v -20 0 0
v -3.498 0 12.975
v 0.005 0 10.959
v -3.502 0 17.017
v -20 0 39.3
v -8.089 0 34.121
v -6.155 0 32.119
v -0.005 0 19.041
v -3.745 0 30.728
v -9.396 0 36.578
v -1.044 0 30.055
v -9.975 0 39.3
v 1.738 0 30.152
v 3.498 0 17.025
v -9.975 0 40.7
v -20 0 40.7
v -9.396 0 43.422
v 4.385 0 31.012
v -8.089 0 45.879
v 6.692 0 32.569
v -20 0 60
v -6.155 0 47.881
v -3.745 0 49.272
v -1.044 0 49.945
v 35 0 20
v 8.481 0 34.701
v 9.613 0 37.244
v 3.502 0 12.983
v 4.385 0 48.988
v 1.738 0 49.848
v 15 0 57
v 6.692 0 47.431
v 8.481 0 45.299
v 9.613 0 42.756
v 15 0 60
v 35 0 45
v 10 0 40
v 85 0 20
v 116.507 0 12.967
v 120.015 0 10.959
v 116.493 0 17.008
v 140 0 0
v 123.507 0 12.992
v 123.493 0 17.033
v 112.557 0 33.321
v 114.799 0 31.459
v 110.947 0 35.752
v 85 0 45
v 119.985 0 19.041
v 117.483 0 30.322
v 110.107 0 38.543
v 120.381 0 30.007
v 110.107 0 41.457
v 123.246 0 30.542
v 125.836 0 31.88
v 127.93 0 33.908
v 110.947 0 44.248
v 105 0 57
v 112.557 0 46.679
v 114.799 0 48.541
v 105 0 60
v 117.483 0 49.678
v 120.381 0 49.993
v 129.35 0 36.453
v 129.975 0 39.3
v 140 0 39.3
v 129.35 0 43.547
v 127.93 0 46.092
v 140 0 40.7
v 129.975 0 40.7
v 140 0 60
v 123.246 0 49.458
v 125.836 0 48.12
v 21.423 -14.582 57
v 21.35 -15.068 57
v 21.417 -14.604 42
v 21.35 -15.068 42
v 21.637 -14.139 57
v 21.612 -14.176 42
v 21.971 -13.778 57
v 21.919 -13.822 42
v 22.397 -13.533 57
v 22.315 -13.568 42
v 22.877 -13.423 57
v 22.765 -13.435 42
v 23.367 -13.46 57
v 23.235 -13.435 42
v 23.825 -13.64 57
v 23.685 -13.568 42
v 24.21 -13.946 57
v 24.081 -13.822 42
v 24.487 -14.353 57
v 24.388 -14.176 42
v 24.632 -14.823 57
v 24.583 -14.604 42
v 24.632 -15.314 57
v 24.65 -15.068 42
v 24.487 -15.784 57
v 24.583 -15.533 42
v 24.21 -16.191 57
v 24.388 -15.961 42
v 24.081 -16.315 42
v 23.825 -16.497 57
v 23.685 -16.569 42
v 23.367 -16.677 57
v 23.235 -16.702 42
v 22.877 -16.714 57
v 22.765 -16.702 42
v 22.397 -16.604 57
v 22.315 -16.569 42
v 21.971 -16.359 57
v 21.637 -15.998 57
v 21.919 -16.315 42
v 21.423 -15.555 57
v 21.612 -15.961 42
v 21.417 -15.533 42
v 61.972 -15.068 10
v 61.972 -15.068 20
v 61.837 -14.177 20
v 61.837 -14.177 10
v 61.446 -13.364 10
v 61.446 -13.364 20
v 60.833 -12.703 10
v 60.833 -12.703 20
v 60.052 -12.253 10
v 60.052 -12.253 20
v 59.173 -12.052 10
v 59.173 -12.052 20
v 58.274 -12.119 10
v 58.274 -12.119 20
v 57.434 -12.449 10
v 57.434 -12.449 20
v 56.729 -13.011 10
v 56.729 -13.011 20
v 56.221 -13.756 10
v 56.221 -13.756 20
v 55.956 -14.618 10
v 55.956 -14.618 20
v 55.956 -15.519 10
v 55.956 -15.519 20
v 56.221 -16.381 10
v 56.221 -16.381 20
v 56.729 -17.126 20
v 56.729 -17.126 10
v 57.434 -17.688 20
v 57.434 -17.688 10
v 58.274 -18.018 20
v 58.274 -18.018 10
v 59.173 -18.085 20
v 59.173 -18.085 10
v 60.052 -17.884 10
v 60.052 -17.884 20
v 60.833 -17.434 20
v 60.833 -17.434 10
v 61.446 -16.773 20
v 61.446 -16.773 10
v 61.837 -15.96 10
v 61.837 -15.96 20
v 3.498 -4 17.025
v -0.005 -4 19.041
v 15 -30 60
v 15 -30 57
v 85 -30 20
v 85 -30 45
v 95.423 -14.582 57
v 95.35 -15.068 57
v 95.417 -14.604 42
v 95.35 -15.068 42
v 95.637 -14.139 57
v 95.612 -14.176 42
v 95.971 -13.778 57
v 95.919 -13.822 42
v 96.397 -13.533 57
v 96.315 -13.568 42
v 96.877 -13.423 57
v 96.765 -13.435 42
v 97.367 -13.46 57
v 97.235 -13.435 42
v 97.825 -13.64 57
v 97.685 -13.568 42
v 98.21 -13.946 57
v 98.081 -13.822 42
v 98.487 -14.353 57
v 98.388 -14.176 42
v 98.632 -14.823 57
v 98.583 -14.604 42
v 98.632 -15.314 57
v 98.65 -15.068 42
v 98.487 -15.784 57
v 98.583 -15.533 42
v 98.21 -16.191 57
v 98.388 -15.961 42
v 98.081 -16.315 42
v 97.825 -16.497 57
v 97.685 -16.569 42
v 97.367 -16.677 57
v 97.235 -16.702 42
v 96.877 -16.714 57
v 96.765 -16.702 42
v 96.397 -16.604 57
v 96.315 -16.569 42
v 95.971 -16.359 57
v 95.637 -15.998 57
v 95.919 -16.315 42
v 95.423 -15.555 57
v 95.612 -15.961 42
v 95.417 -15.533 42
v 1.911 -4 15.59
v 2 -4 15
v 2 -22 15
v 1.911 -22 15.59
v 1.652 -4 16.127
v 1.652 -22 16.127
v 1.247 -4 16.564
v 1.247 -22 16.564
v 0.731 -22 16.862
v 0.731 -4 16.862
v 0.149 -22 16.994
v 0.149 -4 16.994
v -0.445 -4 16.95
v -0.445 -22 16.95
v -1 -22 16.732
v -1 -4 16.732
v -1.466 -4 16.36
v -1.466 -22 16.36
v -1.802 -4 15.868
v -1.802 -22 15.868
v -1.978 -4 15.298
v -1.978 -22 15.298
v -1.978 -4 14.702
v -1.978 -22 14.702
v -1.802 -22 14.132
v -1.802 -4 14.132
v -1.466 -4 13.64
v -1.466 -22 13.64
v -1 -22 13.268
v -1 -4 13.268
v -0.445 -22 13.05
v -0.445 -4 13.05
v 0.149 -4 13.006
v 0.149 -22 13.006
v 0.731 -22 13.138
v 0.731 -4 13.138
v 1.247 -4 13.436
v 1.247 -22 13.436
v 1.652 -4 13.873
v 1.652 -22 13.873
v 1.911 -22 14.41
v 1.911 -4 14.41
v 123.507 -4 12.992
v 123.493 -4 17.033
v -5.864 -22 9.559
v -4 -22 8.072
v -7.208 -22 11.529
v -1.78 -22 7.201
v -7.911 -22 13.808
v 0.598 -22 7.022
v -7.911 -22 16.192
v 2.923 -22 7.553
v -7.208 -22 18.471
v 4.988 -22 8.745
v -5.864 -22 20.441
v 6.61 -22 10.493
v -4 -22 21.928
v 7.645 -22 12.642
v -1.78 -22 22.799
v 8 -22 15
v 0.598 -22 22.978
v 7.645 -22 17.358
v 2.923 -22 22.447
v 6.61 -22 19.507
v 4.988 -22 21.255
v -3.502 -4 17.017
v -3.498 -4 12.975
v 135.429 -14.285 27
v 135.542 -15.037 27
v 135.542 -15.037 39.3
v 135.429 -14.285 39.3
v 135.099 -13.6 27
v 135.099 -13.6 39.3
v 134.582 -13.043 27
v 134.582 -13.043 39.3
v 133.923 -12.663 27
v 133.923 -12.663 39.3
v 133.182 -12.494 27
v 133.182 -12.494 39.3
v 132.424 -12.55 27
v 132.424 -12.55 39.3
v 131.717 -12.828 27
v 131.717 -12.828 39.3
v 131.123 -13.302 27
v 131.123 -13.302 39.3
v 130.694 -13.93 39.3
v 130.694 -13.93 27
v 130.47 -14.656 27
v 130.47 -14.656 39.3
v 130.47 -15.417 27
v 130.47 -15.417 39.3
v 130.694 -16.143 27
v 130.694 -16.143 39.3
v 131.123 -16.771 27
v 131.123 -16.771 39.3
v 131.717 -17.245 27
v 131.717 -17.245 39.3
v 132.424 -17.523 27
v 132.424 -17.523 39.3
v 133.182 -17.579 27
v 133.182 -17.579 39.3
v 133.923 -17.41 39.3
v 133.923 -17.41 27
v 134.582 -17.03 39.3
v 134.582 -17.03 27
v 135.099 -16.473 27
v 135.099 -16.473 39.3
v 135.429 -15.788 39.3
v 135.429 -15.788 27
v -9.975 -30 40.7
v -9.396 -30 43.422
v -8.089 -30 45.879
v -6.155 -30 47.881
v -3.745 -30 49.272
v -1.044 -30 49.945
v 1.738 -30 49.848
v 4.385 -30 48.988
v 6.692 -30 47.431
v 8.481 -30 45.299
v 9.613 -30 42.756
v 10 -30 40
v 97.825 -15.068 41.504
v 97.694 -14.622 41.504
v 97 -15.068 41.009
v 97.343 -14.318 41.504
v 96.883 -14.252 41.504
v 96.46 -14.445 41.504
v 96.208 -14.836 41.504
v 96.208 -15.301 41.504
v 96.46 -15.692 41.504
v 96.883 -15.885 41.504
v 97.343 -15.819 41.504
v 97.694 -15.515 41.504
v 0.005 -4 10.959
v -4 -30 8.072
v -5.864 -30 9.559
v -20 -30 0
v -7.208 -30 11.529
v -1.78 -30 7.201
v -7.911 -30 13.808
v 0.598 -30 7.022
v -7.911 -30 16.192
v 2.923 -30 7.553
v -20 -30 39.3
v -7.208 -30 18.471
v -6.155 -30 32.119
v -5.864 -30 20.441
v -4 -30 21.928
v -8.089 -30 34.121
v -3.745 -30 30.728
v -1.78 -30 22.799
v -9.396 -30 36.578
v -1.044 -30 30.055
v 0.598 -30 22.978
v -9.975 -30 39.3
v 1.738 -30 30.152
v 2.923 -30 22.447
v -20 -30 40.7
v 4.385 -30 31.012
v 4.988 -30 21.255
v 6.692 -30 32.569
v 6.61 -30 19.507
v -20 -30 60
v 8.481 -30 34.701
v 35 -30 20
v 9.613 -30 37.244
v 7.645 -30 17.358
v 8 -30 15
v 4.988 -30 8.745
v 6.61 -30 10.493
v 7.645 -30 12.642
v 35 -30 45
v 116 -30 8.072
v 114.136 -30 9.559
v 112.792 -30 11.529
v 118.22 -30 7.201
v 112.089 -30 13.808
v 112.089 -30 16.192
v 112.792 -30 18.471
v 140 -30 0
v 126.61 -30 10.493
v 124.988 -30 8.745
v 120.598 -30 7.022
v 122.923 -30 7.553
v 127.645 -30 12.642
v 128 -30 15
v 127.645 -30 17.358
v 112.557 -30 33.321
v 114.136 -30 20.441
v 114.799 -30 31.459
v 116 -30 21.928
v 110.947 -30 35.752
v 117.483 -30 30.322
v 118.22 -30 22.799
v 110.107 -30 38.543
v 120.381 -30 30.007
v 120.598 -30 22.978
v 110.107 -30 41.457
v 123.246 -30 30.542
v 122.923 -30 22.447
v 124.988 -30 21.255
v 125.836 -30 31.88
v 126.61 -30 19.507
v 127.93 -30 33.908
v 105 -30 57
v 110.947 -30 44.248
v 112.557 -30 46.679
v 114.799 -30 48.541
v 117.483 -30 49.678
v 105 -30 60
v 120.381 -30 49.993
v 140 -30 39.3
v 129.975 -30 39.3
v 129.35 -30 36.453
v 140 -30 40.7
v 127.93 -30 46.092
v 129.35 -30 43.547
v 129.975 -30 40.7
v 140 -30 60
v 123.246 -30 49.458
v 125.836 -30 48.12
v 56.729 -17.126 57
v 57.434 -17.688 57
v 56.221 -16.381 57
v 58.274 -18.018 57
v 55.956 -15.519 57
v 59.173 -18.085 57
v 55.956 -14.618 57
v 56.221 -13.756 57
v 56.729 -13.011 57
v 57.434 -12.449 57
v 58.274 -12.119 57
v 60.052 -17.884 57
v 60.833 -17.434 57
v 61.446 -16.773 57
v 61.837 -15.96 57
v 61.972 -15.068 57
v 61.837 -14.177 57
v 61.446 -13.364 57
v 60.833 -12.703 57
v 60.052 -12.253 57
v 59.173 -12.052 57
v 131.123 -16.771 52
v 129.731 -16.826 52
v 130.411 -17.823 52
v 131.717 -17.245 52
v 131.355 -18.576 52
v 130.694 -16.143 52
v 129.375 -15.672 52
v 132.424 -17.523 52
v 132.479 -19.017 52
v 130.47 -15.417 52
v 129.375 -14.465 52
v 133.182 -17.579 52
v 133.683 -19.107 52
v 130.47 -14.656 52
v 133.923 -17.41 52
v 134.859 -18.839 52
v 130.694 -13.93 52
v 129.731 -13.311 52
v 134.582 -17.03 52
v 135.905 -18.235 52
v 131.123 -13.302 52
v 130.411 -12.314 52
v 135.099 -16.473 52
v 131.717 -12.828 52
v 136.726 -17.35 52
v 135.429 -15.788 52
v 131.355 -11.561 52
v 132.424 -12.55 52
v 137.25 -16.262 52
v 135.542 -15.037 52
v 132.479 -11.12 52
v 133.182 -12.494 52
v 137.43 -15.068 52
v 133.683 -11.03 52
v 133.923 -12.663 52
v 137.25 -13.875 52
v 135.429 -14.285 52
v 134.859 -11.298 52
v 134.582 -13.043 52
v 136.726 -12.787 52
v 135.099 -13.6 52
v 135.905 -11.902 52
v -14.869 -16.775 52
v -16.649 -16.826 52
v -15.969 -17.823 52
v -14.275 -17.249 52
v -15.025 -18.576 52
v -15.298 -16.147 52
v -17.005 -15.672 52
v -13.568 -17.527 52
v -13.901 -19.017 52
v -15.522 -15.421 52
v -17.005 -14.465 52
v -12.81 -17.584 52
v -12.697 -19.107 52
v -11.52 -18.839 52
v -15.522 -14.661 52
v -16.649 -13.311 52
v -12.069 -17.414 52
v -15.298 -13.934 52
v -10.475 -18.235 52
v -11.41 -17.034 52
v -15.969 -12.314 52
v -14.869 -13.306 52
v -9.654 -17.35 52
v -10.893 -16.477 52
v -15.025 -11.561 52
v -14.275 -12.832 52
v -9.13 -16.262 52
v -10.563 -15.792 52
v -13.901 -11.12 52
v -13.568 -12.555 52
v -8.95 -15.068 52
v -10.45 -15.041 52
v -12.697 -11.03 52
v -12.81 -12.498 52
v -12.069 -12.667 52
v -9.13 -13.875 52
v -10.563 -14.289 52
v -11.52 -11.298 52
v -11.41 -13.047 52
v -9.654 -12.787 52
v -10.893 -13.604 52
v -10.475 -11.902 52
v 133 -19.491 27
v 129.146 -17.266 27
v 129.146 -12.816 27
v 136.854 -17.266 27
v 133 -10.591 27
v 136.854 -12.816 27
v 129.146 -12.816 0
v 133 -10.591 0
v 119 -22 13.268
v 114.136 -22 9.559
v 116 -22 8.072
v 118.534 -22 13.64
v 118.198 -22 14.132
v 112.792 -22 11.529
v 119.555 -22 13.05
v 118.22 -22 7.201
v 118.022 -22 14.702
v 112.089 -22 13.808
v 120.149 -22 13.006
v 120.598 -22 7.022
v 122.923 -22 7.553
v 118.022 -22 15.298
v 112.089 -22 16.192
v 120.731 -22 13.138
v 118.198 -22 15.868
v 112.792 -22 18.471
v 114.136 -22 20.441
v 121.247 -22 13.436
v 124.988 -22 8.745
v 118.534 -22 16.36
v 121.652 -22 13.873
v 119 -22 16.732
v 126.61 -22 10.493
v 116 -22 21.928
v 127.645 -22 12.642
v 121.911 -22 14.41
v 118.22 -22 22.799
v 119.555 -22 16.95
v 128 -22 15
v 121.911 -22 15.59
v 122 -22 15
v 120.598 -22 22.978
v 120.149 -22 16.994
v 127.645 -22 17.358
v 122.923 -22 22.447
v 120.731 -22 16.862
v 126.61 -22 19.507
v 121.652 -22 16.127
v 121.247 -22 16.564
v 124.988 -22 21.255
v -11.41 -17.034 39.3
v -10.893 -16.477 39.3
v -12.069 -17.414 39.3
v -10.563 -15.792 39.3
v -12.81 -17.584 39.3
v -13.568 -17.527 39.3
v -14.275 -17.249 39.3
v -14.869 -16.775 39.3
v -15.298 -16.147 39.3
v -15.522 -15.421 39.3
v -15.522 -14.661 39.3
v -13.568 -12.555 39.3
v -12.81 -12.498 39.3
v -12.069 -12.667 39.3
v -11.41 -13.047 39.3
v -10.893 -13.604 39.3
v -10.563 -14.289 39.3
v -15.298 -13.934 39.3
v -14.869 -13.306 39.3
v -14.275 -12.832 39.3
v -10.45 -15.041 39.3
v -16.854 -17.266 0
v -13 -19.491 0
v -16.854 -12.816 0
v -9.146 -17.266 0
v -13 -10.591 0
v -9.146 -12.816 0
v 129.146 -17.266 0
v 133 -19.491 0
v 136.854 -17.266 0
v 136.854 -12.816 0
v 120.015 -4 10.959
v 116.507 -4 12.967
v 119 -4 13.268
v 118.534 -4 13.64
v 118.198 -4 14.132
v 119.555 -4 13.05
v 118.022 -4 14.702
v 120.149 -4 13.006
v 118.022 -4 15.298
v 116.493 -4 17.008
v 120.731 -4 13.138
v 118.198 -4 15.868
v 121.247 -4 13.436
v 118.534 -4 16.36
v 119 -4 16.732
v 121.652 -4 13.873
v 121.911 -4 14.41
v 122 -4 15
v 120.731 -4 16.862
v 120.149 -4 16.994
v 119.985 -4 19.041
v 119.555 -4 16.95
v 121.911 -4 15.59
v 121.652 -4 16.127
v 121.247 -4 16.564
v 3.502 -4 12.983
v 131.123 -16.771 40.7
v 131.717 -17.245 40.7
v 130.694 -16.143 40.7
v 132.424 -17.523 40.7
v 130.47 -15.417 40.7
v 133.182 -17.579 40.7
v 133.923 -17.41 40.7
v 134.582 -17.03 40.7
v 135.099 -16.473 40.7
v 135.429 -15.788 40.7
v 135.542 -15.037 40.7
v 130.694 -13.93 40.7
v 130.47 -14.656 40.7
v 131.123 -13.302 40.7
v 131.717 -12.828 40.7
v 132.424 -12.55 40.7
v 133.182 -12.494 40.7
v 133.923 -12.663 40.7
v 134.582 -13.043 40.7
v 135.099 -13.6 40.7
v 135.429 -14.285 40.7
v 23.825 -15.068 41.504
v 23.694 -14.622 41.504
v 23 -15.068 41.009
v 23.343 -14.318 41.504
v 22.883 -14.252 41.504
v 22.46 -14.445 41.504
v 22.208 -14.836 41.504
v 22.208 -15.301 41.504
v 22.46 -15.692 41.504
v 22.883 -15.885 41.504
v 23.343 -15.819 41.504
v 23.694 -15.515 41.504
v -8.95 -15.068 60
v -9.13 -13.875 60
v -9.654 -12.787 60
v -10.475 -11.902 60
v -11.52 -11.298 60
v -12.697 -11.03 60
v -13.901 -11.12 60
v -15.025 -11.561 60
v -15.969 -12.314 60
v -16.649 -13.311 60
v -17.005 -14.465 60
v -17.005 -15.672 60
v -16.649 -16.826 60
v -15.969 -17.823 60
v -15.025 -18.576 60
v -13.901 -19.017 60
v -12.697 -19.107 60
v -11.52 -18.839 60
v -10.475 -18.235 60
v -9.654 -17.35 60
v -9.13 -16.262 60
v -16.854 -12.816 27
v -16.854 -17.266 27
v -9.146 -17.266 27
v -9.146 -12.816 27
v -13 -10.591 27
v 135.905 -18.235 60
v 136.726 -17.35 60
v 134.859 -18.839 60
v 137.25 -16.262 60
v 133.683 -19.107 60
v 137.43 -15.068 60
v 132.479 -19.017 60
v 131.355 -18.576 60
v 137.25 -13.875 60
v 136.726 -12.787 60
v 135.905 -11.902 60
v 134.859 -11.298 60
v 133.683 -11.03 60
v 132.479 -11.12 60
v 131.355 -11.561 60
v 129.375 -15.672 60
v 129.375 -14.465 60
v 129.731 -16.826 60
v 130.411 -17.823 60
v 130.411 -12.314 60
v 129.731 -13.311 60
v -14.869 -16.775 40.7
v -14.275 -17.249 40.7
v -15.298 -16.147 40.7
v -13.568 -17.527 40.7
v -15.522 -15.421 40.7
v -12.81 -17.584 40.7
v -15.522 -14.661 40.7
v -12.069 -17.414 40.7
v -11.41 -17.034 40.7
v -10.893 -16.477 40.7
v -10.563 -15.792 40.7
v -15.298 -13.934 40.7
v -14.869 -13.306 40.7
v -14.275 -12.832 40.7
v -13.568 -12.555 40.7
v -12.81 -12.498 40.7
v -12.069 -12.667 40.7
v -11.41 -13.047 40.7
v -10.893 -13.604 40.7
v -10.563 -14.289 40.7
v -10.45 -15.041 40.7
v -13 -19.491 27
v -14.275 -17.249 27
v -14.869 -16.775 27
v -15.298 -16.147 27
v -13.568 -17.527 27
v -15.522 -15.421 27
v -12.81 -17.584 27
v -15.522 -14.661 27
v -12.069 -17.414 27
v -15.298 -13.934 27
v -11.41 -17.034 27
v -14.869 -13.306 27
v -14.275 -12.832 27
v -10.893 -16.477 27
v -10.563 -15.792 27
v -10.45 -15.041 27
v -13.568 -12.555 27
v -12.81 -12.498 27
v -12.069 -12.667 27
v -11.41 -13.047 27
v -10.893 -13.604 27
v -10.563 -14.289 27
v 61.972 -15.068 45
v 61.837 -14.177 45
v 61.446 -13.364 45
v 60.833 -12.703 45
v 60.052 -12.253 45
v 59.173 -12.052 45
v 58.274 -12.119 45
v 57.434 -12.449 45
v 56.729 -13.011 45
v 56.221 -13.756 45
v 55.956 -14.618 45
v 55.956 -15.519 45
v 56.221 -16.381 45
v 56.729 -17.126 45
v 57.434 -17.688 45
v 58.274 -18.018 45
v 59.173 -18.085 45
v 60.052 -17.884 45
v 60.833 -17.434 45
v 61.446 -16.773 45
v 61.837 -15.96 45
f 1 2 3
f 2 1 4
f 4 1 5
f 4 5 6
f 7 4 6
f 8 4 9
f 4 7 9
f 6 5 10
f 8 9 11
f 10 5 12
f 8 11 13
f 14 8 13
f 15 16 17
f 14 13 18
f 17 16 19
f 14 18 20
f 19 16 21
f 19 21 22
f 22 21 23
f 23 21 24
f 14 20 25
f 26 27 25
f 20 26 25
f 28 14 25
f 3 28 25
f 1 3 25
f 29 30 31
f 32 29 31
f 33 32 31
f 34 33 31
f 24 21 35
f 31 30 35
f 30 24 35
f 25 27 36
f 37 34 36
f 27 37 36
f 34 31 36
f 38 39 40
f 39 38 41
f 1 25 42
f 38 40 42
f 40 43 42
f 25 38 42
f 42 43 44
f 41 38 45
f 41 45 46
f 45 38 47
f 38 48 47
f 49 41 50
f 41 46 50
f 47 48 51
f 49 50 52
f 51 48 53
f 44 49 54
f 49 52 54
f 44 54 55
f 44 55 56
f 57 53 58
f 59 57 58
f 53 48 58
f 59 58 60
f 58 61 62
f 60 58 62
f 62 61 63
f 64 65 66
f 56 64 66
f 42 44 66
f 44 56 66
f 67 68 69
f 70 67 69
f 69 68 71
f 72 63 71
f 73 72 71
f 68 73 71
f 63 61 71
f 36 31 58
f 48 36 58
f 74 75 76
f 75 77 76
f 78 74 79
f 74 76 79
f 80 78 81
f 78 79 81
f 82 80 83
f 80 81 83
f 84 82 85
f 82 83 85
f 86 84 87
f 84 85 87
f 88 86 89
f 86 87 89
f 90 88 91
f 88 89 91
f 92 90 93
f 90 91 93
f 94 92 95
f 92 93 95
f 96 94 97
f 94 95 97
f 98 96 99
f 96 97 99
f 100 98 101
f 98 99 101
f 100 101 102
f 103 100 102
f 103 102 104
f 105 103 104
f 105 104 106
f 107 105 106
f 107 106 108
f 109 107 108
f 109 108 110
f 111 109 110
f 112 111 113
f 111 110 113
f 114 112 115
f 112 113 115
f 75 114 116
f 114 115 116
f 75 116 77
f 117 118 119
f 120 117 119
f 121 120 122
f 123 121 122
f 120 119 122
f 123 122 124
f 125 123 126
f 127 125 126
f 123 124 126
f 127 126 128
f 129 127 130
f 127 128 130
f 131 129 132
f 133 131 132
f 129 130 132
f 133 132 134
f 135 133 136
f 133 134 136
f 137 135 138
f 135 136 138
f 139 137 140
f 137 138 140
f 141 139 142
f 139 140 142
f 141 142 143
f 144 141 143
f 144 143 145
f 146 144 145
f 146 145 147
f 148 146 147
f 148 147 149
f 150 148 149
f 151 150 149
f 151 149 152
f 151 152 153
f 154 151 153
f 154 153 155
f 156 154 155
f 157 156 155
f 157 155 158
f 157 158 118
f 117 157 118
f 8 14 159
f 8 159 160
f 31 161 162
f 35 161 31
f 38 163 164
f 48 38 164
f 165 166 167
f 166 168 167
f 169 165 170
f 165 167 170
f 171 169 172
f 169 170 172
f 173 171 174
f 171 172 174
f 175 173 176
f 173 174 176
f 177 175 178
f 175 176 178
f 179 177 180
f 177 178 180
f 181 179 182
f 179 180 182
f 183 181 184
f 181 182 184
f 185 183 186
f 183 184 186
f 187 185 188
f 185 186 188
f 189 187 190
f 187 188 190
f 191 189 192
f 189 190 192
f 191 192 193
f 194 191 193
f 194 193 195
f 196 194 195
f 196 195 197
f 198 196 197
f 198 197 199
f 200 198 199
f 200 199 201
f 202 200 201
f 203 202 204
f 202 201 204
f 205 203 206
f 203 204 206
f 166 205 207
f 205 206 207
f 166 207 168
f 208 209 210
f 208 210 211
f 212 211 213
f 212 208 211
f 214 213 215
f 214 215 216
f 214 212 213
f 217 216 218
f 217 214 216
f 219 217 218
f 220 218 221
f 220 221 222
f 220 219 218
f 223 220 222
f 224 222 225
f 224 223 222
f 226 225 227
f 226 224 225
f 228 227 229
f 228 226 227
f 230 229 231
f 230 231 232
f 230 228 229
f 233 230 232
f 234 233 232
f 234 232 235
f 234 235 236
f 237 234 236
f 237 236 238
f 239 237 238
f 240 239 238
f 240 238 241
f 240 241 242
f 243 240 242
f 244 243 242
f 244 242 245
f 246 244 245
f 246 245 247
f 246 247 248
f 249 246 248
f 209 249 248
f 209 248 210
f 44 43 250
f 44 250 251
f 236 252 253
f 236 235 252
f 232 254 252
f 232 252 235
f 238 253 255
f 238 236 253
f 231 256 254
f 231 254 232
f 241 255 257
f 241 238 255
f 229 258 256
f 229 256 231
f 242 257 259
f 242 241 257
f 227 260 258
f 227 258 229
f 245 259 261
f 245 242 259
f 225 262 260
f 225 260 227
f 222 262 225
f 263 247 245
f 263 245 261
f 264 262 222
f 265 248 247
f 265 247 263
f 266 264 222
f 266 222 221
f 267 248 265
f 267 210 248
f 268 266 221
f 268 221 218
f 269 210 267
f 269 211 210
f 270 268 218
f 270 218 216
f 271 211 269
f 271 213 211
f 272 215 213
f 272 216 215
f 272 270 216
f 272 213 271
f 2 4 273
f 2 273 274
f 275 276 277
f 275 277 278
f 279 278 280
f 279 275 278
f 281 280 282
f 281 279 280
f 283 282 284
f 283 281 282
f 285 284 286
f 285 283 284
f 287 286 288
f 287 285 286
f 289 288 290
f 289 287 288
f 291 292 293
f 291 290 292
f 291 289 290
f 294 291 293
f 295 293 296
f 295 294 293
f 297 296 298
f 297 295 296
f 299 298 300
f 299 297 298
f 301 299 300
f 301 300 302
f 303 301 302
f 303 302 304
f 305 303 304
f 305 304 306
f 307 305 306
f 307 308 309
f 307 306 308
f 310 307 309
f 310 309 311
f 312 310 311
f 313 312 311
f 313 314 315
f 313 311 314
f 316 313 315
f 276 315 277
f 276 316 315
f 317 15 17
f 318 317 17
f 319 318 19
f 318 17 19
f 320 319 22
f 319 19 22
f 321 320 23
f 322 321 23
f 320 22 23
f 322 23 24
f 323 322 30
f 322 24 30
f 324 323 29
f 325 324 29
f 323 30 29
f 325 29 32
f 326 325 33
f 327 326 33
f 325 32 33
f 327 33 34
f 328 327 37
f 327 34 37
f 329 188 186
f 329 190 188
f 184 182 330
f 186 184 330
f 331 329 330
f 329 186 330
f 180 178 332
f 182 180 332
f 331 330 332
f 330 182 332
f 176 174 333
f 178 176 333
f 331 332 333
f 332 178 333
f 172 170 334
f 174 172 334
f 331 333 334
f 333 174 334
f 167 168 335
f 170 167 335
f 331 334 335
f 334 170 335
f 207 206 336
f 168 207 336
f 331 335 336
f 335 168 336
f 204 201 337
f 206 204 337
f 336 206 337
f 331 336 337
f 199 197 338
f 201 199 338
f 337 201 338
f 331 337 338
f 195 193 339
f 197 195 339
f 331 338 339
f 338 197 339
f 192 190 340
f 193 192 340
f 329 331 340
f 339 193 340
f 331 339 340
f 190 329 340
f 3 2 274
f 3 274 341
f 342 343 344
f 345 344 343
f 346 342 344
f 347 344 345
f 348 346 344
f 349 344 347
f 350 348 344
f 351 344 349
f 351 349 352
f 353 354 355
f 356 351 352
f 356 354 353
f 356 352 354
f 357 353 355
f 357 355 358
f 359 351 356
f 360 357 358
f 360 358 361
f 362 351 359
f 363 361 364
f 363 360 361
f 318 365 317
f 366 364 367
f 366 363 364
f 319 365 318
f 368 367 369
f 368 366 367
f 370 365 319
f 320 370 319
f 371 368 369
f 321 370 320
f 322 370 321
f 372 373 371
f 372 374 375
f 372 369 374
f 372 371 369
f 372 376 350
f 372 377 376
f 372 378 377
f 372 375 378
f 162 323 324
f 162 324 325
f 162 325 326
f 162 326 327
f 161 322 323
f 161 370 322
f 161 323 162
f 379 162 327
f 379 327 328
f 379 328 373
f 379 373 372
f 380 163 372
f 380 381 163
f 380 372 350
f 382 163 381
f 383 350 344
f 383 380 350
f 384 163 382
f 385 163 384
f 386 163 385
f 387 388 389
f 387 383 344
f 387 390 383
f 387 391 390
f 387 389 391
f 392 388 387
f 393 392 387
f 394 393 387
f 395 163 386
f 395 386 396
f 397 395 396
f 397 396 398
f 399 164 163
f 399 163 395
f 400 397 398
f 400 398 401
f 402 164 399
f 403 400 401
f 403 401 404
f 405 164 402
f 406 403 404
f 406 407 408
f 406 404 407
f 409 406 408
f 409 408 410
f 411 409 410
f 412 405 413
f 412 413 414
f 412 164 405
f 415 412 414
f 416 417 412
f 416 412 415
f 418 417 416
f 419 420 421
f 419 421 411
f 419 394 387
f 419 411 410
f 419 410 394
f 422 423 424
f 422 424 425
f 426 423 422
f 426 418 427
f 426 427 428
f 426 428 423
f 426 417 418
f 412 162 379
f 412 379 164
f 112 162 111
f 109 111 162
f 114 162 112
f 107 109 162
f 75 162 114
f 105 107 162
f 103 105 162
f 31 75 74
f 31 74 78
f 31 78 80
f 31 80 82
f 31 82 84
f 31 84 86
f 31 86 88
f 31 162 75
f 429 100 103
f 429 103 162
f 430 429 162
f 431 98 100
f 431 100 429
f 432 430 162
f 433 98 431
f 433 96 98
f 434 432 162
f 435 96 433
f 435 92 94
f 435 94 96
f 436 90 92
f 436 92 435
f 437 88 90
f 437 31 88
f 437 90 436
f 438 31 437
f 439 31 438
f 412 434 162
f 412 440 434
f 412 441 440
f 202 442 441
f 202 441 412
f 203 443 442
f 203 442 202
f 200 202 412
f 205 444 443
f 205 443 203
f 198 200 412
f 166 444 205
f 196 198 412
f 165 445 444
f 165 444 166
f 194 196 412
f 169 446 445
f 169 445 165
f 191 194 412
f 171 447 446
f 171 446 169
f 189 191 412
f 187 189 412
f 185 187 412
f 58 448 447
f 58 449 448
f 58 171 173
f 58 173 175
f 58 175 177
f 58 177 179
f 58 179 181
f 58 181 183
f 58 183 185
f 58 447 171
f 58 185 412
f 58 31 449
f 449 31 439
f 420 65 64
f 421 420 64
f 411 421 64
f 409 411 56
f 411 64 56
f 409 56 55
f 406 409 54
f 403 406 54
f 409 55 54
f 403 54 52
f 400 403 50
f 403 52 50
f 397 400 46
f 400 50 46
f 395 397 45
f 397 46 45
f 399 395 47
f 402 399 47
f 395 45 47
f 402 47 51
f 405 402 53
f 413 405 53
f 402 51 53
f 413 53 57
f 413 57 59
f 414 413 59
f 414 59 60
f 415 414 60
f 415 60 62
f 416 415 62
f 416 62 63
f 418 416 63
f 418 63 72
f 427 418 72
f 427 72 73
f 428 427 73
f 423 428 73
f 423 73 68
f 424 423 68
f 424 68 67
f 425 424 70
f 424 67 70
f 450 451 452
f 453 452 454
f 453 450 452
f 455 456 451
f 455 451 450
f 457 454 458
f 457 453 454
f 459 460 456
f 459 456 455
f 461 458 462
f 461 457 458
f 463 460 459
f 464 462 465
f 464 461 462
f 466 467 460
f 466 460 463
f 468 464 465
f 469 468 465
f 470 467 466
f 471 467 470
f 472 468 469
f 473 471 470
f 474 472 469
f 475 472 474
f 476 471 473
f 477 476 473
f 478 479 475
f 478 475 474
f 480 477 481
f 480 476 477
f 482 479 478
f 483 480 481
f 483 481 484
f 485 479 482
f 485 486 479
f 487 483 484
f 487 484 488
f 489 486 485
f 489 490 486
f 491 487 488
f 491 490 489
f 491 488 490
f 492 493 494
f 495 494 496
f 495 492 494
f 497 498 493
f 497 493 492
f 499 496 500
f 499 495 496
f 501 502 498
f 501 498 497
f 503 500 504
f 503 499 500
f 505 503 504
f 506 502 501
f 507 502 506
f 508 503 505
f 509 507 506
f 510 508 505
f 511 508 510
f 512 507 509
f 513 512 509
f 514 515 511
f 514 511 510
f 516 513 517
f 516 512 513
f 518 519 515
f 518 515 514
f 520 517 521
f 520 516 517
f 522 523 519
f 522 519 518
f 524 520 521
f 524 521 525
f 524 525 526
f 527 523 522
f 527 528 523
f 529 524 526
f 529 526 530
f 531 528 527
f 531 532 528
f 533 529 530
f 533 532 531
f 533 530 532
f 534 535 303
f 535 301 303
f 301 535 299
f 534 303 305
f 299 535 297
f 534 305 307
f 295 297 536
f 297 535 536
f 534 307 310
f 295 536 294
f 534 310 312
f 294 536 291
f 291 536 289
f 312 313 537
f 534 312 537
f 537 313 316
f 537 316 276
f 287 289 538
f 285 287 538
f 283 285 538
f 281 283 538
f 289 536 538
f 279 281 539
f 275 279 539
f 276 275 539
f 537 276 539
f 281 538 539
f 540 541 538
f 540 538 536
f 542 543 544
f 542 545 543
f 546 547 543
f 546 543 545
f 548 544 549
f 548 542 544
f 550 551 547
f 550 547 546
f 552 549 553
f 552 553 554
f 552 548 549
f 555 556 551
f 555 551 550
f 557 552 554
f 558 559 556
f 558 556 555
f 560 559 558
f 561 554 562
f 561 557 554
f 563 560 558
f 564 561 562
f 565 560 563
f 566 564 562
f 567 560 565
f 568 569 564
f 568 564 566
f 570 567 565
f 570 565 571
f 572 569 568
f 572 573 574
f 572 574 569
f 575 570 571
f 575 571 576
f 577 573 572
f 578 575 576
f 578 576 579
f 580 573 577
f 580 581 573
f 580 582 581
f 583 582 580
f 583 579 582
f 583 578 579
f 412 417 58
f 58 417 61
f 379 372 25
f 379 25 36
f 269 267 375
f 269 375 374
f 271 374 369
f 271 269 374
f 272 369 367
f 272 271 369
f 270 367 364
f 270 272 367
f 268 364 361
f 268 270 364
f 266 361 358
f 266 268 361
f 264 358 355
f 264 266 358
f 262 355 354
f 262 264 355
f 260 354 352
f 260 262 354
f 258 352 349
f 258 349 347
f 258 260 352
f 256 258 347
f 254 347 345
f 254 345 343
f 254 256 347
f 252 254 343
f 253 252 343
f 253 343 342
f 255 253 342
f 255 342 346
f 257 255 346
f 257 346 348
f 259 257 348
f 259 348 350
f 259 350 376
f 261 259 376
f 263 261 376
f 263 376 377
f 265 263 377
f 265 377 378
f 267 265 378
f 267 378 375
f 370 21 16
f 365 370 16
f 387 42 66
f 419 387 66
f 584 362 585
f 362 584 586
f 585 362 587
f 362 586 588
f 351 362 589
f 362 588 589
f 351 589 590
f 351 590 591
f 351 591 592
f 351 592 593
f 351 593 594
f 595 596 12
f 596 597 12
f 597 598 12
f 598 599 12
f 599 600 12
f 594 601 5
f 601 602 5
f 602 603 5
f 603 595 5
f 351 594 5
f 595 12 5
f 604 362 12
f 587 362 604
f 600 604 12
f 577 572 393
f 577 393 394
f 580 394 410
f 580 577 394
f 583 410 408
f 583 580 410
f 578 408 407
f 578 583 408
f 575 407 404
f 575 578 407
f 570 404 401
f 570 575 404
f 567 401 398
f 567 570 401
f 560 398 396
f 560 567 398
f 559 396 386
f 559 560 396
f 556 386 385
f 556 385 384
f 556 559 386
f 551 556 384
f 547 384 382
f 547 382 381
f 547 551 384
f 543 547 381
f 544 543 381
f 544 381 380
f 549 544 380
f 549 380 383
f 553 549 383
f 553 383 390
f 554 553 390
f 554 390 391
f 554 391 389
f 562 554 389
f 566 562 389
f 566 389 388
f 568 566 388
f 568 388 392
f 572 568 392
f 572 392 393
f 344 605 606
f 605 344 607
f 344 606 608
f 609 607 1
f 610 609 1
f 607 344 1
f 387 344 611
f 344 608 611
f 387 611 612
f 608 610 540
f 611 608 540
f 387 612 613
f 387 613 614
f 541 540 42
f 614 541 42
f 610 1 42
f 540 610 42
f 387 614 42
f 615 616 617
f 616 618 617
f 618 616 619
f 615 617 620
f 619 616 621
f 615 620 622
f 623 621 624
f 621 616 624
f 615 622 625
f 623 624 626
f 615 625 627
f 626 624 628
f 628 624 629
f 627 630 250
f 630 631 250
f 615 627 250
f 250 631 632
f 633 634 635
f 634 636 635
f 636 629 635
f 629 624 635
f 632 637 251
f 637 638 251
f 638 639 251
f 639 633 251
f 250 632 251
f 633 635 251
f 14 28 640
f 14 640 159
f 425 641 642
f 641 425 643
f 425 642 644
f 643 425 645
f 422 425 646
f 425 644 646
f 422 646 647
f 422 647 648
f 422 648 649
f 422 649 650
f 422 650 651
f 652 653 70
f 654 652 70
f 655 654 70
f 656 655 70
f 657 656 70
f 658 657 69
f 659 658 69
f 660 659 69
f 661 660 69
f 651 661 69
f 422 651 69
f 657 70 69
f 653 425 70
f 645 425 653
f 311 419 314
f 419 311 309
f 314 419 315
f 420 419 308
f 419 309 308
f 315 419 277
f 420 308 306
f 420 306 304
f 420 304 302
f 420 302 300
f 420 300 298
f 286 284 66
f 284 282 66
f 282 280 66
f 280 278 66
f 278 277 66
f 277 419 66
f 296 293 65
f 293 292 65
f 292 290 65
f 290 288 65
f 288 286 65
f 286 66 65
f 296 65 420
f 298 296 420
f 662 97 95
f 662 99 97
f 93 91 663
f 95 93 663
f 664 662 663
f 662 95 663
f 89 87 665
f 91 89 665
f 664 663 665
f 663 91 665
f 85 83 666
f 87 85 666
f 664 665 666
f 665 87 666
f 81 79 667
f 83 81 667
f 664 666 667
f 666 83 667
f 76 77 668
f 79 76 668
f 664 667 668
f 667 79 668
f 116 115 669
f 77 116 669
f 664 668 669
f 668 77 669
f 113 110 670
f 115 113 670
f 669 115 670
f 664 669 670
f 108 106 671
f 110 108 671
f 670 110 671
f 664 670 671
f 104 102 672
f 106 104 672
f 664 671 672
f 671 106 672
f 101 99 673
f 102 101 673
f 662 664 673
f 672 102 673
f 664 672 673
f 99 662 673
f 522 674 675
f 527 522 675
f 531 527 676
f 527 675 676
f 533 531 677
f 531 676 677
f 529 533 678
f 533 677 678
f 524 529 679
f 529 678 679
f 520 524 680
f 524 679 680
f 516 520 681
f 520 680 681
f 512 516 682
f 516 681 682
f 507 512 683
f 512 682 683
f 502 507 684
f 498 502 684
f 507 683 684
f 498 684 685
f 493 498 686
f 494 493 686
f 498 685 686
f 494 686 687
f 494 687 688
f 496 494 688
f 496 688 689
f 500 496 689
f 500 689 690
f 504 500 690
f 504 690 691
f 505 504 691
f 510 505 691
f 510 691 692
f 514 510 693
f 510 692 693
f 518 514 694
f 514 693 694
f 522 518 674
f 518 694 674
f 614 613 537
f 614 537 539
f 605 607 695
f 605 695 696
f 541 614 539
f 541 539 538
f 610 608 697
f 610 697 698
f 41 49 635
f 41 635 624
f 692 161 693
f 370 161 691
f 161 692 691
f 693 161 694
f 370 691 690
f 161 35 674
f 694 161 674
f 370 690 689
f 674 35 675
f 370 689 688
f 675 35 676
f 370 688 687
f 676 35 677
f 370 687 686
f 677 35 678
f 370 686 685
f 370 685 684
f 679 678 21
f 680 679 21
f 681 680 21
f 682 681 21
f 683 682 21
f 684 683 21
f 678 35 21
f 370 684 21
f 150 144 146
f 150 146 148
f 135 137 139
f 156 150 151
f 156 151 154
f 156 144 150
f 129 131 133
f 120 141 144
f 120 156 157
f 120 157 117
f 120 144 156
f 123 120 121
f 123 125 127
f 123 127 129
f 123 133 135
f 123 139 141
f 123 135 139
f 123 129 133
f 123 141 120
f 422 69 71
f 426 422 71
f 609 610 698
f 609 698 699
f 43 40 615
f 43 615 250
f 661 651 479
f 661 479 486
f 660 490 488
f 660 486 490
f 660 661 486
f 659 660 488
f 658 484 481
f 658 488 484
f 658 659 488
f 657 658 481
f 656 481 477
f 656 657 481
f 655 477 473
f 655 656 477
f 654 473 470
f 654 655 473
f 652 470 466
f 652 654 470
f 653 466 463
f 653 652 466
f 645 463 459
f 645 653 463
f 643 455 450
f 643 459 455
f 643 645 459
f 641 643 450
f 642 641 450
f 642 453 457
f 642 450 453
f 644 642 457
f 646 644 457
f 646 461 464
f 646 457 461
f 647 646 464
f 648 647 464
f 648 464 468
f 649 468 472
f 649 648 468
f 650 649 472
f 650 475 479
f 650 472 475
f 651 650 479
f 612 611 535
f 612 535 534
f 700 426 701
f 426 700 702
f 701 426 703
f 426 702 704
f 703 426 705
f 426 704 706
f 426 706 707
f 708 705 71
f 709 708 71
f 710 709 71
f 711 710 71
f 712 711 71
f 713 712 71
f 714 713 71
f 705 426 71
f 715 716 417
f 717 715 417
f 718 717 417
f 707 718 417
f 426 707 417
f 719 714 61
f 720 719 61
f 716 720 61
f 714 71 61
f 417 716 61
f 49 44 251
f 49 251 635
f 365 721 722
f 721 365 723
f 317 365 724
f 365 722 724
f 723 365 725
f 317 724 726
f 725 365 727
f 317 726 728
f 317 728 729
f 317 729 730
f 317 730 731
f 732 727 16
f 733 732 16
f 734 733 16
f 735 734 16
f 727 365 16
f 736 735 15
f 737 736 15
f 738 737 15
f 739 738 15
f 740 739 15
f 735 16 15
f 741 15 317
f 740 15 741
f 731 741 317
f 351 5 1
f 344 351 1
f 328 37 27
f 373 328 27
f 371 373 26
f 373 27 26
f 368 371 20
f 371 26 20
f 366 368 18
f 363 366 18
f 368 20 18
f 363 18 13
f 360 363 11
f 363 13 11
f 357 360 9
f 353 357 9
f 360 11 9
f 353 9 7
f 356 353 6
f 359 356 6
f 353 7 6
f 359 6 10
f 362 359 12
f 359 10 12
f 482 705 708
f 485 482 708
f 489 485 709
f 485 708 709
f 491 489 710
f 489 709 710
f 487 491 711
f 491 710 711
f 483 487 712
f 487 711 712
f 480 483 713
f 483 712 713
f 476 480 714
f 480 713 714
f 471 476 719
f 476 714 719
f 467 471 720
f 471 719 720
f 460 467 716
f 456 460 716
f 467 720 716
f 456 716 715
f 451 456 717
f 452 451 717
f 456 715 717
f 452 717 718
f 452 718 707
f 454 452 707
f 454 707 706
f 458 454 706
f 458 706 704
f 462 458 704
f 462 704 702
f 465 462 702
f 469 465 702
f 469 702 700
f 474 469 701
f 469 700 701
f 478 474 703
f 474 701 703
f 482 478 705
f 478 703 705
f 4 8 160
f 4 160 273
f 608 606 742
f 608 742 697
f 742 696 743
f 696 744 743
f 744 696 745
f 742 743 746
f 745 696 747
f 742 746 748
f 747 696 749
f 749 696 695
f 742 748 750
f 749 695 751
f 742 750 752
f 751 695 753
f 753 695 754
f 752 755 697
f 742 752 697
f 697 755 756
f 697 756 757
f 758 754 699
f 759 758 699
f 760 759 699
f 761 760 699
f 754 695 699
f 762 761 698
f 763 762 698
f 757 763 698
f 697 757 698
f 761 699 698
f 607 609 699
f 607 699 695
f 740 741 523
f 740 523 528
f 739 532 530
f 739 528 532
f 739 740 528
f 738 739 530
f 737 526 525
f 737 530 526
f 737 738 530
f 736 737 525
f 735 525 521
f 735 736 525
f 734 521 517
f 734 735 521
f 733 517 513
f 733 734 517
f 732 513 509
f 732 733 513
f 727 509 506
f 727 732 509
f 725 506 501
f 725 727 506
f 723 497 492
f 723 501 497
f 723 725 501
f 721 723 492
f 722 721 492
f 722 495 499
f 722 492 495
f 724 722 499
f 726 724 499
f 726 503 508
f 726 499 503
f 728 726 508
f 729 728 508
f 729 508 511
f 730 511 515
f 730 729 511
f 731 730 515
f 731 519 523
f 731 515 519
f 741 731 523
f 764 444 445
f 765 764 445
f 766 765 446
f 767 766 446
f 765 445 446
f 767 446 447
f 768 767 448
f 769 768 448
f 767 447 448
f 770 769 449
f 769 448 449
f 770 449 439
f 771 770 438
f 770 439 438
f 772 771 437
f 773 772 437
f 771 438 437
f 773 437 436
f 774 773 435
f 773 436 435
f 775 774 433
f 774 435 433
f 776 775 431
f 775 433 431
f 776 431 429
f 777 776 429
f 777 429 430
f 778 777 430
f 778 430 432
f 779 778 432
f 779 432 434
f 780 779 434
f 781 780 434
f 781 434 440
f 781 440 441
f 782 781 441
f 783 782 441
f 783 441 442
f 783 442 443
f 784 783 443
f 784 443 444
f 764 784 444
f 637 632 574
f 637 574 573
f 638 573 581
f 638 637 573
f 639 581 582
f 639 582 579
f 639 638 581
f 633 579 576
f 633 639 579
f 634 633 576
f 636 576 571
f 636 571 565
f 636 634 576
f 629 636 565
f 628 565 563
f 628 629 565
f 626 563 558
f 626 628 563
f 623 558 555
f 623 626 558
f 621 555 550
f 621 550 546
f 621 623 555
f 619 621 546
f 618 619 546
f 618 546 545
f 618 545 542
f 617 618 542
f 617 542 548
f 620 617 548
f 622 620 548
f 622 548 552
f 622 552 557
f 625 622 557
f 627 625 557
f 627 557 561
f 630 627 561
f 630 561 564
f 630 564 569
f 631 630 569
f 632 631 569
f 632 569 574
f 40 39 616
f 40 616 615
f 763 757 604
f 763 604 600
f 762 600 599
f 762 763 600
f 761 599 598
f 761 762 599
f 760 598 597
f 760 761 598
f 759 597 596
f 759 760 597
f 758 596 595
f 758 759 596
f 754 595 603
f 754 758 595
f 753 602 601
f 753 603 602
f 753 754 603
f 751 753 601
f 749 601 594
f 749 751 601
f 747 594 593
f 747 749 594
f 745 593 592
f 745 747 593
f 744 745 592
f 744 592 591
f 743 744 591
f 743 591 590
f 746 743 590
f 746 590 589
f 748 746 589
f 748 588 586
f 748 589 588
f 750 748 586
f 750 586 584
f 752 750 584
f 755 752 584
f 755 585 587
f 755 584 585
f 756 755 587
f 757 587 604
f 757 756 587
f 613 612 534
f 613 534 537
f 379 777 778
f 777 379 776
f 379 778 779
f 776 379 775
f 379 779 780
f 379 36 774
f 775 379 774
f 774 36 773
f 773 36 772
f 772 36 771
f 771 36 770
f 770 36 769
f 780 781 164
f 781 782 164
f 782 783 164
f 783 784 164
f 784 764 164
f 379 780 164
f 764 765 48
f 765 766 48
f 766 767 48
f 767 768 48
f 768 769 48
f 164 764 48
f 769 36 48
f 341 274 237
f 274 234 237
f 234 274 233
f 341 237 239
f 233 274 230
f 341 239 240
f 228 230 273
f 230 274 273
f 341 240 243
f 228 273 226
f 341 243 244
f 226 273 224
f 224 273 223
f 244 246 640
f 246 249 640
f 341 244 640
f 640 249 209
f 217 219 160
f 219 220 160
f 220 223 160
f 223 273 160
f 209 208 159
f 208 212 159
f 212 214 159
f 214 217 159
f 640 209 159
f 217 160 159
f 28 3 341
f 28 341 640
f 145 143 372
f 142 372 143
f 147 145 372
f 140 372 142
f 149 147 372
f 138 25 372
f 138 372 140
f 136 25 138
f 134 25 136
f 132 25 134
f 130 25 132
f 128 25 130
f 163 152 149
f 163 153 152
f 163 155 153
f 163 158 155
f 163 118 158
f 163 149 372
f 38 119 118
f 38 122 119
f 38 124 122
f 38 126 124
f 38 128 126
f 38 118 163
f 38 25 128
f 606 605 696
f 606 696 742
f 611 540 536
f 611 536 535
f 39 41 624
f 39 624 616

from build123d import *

# Parameters (mm, degrees)
F0_R      = 8
F0_W      = 50
F0_H      = 25
F1_DEPTH  = 30
F3_DEPTH  = 27
F4_R      = 2.55
F5_DEPTH  = 60.001
F4_R_2    = 4.05
F6_DEPTH  = 10
F8_R      = 4.05
F9_DEPTH  = 8
F8_R_2    = 3.025
F10_DEPTH = 50
F8_W      = 90
F8_H      = 31.7965019494
F11_DEPTH = 3
F12_D     = 3.3
F12_DEPTH = 18
F12_TIP   = 0.9914200214
F0_R_2    = 2
F13_DEPTH = 4
F14_DEPTH = 22
F15_DEPTH = 22
F16_DEPTH = 4


with BuildPart() as f1:
    # F0 (on Front) → F1 (new body)
    with BuildSketch(Plane.XZ):
        with BuildLine():
            Line((-20, 39.3), (-20, 0))
            Line((-20, 0), (140, 0))
            Line((140, 0), (140, 39.3))
            Line((140, 39.3), (129.9754699137, 39.3))
            ThreePointArc((129.9754699137, 39.3), (110, 40), (129.9754699137, 40.7))
            Line((129.9754699137, 40.7), (140, 40.7))
            Line((140, 40.7), (140, 60))
            Line((140, 60), (-20, 60))
            Line((-20, 60), (-20, 40.7))
            Line((-20, 40.7), (-9.9754699137, 40.7))
            ThreePointArc((-9.9754699137, 40.7), (0.3502148359, 49.9938655969), (10, 40))
            ThreePointArc((10, 40), (0.3502148359, 30.0061344031), (-9.9754699137, 39.3))
            Line((-9.9754699137, 39.3), (-20, 39.3))
        make_face()
        with Locations((0, 15)):
            Circle(F0_R, mode=Mode.SUBTRACT)
        with Locations((120, 15)):
            Circle(F0_R, mode=Mode.SUBTRACT)
        with Locations((60, 32.5)):
            Rectangle(F0_W, F0_H, mode=Mode.SUBTRACT)
    extrude(amount=F1_DEPTH)

    # F2 (on Top) → F3 (cut)
    with BuildSketch(Plane.XY):
        Polygon((129.1461869532, -12.8157012552), (129.1461869532, -17.2657012552), (133, -19.4907012552), (136.8538130468, -17.2657012552), (136.8538130468, -12.8157012552), (133, -10.5907012552), align=None)
        Polygon((-16.8538130468, -12.8157012552), (-16.8538130468, -17.2657012552), (-13, -19.4907012552), (-9.1461869532, -17.2657012552), (-9.1461869532, -12.8157012552), (-13, -10.5907012552), align=None)
    extrude(amount=F3_DEPTH, mode=Mode.SUBTRACT)

    # F4 (on Top) → F5 (cut, through all)
    with BuildSketch(Plane.XY):
        with Locations((132.991835475, -15.0365363806)):
            Circle(F4_R)
        with Locations((-13.0001418293, -15.0407049805)):
            Circle(F4_R)
    extrude(amount=F5_DEPTH, mode=Mode.SUBTRACT)

    # F4 (on Top) → F6 (cut)
    with BuildSketch(Plane.XY):
        with Locations((-13.0001418293, -15.0407049805)):
            Circle(F4_R_2)
        with Locations((-13.0001418293, -15.0407049805)):
            Circle(F4_R, mode=Mode.SUBTRACT)
        with Locations((132.991835475, -15.0365363806)):
            Circle(F4_R_2)
        with Locations((132.991835475, -15.0365363806)):
            Circle(F4_R, mode=Mode.SUBTRACT)
    extrude(amount=-F6_DEPTH, mode=Mode.SUBTRACT)

    # F8 (on offset) → F9 (cut)
    with BuildSketch(Plane.XY.offset(60)):
        with Locations((-12.9998153025, -15.0684969688)):
            Circle(F8_R)
        with Locations((133.3798532359, -15.0684969688)):
            Circle(F8_R)
    extrude(amount=-F9_DEPTH, mode=Mode.SUBTRACT)

    # F8 (on offset) → F10 (cut)
    with BuildSketch(Plane.XY.offset(60)):
        with Locations((58.9467886905, -15.0684969688)):
            Circle(F8_R_2)
    extrude(amount=-F10_DEPTH, mode=Mode.SUBTRACT)

    # F8 (on offset) → F11 (cut)
    with BuildSketch(Plane.XY.offset(60)):
        with Locations((60, -15.8982509747)):
            Rectangle(F8_W, F8_H)
        with Locations((58.9467886905, -15.0684969688)):
            Circle(F8_R_2, mode=Mode.SUBTRACT)
    extrude(amount=-F11_DEPTH, mode=Mode.SUBTRACT)

    # F12
    with Locations(Plane.XY.offset(60)):
        with Locations((23, -15.0684969688), (97, -15.0684969688)):
            Hole(F12_D / 2, depth=F12_DEPTH)
            with Locations((0, 0, -(F12_DEPTH + F12_TIP / 2))):  # 118° drill point
                Cone(0, F12_D / 2, F12_TIP, mode=Mode.SUBTRACT)

    # F0 (on Front) → F13 (cut)
    with BuildSketch(Plane.XZ):
        Polygon((-0.0046422602, 19.0414518843), (-3.5023211301, 17.0167056269), (-3.4976788699, 12.9752537426), (0.0046422602, 10.9585481157), (3.5023211301, 12.9832943731), (3.4976788699, 17.0247462574), align=None)
        with Locations((0, 15)):
            Circle(F0_R_2, mode=Mode.SUBTRACT)
        Polygon((123.4926623645, 17.0333821434), (119.9853705905, 19.0414254062), (116.492708226, 17.0080432628), (116.5073376355, 12.9666178566), (120.0146294095, 10.9585745938), (123.507291774, 12.9919567372), align=None)
        with Locations((120, 15)):
            Circle(F0_R_2, mode=Mode.SUBTRACT)
    extrude(amount=F13_DEPTH, mode=Mode.SUBTRACT)

    # F0 (on Front) → F14 (join)
    with BuildSketch(Plane.XZ):
        with Locations((120, 15)):
            Circle(F0_R)
        Polygon((116.492708226, 17.0080432628), (119.9853705905, 19.0414254062), (123.4926623645, 17.0333821434), (123.507291774, 12.9919567372), (120.0146294095, 10.9585745938), (116.5073376355, 12.9666178566), align=None, mode=Mode.SUBTRACT)
        with Locations((0, 15)):
            Circle(F0_R)
        Polygon((-3.4976788699, 12.9752537426), (-3.5023211301, 17.0167056269), (-0.0046422602, 19.0414518843), (3.4976788699, 17.0247462574), (3.5023211301, 12.9832943731), (0.0046422602, 10.9585481157), align=None, mode=Mode.SUBTRACT)
    extrude(amount=F14_DEPTH)

    # F0 (on Front) → F15 (join)
    with BuildSketch(Plane.XZ):
        Polygon((123.4926623645, 17.0333821434), (119.9853705905, 19.0414254062), (116.492708226, 17.0080432628), (116.5073376355, 12.9666178566), (120.0146294095, 10.9585745938), (123.507291774, 12.9919567372), align=None)
        with Locations((120, 15)):
            Circle(F0_R_2, mode=Mode.SUBTRACT)
        Polygon((-0.0046422602, 19.0414518843), (-3.5023211301, 17.0167056269), (-3.4976788699, 12.9752537426), (0.0046422602, 10.9585481157), (3.5023211301, 12.9832943731), (3.4976788699, 17.0247462574), align=None)
        with Locations((0, 15)):
            Circle(F0_R_2, mode=Mode.SUBTRACT)
    extrude(amount=F15_DEPTH)

    # F0 (on Front) → F16 (cut)
    with BuildSketch(Plane.XZ):
        Polygon((-0.0046422602, 19.0414518843), (-3.5023211301, 17.0167056269), (-3.4976788699, 12.9752537426), (0.0046422602, 10.9585481157), (3.5023211301, 12.9832943731), (3.4976788699, 17.0247462574), align=None)
        with Locations((0, 15)):
            Circle(F0_R_2, mode=Mode.SUBTRACT)
        Polygon((123.4926623645, 17.0333821434), (119.9853705905, 19.0414254062), (116.492708226, 17.0080432628), (116.5073376355, 12.9666178566), (120.0146294095, 10.9585745938), (123.507291774, 12.9919567372), align=None)
        with Locations((120, 15)):
            Circle(F0_R_2, mode=Mode.SUBTRACT)
    extrude(amount=F16_DEPTH, mode=Mode.SUBTRACT)


solid = f1.part
